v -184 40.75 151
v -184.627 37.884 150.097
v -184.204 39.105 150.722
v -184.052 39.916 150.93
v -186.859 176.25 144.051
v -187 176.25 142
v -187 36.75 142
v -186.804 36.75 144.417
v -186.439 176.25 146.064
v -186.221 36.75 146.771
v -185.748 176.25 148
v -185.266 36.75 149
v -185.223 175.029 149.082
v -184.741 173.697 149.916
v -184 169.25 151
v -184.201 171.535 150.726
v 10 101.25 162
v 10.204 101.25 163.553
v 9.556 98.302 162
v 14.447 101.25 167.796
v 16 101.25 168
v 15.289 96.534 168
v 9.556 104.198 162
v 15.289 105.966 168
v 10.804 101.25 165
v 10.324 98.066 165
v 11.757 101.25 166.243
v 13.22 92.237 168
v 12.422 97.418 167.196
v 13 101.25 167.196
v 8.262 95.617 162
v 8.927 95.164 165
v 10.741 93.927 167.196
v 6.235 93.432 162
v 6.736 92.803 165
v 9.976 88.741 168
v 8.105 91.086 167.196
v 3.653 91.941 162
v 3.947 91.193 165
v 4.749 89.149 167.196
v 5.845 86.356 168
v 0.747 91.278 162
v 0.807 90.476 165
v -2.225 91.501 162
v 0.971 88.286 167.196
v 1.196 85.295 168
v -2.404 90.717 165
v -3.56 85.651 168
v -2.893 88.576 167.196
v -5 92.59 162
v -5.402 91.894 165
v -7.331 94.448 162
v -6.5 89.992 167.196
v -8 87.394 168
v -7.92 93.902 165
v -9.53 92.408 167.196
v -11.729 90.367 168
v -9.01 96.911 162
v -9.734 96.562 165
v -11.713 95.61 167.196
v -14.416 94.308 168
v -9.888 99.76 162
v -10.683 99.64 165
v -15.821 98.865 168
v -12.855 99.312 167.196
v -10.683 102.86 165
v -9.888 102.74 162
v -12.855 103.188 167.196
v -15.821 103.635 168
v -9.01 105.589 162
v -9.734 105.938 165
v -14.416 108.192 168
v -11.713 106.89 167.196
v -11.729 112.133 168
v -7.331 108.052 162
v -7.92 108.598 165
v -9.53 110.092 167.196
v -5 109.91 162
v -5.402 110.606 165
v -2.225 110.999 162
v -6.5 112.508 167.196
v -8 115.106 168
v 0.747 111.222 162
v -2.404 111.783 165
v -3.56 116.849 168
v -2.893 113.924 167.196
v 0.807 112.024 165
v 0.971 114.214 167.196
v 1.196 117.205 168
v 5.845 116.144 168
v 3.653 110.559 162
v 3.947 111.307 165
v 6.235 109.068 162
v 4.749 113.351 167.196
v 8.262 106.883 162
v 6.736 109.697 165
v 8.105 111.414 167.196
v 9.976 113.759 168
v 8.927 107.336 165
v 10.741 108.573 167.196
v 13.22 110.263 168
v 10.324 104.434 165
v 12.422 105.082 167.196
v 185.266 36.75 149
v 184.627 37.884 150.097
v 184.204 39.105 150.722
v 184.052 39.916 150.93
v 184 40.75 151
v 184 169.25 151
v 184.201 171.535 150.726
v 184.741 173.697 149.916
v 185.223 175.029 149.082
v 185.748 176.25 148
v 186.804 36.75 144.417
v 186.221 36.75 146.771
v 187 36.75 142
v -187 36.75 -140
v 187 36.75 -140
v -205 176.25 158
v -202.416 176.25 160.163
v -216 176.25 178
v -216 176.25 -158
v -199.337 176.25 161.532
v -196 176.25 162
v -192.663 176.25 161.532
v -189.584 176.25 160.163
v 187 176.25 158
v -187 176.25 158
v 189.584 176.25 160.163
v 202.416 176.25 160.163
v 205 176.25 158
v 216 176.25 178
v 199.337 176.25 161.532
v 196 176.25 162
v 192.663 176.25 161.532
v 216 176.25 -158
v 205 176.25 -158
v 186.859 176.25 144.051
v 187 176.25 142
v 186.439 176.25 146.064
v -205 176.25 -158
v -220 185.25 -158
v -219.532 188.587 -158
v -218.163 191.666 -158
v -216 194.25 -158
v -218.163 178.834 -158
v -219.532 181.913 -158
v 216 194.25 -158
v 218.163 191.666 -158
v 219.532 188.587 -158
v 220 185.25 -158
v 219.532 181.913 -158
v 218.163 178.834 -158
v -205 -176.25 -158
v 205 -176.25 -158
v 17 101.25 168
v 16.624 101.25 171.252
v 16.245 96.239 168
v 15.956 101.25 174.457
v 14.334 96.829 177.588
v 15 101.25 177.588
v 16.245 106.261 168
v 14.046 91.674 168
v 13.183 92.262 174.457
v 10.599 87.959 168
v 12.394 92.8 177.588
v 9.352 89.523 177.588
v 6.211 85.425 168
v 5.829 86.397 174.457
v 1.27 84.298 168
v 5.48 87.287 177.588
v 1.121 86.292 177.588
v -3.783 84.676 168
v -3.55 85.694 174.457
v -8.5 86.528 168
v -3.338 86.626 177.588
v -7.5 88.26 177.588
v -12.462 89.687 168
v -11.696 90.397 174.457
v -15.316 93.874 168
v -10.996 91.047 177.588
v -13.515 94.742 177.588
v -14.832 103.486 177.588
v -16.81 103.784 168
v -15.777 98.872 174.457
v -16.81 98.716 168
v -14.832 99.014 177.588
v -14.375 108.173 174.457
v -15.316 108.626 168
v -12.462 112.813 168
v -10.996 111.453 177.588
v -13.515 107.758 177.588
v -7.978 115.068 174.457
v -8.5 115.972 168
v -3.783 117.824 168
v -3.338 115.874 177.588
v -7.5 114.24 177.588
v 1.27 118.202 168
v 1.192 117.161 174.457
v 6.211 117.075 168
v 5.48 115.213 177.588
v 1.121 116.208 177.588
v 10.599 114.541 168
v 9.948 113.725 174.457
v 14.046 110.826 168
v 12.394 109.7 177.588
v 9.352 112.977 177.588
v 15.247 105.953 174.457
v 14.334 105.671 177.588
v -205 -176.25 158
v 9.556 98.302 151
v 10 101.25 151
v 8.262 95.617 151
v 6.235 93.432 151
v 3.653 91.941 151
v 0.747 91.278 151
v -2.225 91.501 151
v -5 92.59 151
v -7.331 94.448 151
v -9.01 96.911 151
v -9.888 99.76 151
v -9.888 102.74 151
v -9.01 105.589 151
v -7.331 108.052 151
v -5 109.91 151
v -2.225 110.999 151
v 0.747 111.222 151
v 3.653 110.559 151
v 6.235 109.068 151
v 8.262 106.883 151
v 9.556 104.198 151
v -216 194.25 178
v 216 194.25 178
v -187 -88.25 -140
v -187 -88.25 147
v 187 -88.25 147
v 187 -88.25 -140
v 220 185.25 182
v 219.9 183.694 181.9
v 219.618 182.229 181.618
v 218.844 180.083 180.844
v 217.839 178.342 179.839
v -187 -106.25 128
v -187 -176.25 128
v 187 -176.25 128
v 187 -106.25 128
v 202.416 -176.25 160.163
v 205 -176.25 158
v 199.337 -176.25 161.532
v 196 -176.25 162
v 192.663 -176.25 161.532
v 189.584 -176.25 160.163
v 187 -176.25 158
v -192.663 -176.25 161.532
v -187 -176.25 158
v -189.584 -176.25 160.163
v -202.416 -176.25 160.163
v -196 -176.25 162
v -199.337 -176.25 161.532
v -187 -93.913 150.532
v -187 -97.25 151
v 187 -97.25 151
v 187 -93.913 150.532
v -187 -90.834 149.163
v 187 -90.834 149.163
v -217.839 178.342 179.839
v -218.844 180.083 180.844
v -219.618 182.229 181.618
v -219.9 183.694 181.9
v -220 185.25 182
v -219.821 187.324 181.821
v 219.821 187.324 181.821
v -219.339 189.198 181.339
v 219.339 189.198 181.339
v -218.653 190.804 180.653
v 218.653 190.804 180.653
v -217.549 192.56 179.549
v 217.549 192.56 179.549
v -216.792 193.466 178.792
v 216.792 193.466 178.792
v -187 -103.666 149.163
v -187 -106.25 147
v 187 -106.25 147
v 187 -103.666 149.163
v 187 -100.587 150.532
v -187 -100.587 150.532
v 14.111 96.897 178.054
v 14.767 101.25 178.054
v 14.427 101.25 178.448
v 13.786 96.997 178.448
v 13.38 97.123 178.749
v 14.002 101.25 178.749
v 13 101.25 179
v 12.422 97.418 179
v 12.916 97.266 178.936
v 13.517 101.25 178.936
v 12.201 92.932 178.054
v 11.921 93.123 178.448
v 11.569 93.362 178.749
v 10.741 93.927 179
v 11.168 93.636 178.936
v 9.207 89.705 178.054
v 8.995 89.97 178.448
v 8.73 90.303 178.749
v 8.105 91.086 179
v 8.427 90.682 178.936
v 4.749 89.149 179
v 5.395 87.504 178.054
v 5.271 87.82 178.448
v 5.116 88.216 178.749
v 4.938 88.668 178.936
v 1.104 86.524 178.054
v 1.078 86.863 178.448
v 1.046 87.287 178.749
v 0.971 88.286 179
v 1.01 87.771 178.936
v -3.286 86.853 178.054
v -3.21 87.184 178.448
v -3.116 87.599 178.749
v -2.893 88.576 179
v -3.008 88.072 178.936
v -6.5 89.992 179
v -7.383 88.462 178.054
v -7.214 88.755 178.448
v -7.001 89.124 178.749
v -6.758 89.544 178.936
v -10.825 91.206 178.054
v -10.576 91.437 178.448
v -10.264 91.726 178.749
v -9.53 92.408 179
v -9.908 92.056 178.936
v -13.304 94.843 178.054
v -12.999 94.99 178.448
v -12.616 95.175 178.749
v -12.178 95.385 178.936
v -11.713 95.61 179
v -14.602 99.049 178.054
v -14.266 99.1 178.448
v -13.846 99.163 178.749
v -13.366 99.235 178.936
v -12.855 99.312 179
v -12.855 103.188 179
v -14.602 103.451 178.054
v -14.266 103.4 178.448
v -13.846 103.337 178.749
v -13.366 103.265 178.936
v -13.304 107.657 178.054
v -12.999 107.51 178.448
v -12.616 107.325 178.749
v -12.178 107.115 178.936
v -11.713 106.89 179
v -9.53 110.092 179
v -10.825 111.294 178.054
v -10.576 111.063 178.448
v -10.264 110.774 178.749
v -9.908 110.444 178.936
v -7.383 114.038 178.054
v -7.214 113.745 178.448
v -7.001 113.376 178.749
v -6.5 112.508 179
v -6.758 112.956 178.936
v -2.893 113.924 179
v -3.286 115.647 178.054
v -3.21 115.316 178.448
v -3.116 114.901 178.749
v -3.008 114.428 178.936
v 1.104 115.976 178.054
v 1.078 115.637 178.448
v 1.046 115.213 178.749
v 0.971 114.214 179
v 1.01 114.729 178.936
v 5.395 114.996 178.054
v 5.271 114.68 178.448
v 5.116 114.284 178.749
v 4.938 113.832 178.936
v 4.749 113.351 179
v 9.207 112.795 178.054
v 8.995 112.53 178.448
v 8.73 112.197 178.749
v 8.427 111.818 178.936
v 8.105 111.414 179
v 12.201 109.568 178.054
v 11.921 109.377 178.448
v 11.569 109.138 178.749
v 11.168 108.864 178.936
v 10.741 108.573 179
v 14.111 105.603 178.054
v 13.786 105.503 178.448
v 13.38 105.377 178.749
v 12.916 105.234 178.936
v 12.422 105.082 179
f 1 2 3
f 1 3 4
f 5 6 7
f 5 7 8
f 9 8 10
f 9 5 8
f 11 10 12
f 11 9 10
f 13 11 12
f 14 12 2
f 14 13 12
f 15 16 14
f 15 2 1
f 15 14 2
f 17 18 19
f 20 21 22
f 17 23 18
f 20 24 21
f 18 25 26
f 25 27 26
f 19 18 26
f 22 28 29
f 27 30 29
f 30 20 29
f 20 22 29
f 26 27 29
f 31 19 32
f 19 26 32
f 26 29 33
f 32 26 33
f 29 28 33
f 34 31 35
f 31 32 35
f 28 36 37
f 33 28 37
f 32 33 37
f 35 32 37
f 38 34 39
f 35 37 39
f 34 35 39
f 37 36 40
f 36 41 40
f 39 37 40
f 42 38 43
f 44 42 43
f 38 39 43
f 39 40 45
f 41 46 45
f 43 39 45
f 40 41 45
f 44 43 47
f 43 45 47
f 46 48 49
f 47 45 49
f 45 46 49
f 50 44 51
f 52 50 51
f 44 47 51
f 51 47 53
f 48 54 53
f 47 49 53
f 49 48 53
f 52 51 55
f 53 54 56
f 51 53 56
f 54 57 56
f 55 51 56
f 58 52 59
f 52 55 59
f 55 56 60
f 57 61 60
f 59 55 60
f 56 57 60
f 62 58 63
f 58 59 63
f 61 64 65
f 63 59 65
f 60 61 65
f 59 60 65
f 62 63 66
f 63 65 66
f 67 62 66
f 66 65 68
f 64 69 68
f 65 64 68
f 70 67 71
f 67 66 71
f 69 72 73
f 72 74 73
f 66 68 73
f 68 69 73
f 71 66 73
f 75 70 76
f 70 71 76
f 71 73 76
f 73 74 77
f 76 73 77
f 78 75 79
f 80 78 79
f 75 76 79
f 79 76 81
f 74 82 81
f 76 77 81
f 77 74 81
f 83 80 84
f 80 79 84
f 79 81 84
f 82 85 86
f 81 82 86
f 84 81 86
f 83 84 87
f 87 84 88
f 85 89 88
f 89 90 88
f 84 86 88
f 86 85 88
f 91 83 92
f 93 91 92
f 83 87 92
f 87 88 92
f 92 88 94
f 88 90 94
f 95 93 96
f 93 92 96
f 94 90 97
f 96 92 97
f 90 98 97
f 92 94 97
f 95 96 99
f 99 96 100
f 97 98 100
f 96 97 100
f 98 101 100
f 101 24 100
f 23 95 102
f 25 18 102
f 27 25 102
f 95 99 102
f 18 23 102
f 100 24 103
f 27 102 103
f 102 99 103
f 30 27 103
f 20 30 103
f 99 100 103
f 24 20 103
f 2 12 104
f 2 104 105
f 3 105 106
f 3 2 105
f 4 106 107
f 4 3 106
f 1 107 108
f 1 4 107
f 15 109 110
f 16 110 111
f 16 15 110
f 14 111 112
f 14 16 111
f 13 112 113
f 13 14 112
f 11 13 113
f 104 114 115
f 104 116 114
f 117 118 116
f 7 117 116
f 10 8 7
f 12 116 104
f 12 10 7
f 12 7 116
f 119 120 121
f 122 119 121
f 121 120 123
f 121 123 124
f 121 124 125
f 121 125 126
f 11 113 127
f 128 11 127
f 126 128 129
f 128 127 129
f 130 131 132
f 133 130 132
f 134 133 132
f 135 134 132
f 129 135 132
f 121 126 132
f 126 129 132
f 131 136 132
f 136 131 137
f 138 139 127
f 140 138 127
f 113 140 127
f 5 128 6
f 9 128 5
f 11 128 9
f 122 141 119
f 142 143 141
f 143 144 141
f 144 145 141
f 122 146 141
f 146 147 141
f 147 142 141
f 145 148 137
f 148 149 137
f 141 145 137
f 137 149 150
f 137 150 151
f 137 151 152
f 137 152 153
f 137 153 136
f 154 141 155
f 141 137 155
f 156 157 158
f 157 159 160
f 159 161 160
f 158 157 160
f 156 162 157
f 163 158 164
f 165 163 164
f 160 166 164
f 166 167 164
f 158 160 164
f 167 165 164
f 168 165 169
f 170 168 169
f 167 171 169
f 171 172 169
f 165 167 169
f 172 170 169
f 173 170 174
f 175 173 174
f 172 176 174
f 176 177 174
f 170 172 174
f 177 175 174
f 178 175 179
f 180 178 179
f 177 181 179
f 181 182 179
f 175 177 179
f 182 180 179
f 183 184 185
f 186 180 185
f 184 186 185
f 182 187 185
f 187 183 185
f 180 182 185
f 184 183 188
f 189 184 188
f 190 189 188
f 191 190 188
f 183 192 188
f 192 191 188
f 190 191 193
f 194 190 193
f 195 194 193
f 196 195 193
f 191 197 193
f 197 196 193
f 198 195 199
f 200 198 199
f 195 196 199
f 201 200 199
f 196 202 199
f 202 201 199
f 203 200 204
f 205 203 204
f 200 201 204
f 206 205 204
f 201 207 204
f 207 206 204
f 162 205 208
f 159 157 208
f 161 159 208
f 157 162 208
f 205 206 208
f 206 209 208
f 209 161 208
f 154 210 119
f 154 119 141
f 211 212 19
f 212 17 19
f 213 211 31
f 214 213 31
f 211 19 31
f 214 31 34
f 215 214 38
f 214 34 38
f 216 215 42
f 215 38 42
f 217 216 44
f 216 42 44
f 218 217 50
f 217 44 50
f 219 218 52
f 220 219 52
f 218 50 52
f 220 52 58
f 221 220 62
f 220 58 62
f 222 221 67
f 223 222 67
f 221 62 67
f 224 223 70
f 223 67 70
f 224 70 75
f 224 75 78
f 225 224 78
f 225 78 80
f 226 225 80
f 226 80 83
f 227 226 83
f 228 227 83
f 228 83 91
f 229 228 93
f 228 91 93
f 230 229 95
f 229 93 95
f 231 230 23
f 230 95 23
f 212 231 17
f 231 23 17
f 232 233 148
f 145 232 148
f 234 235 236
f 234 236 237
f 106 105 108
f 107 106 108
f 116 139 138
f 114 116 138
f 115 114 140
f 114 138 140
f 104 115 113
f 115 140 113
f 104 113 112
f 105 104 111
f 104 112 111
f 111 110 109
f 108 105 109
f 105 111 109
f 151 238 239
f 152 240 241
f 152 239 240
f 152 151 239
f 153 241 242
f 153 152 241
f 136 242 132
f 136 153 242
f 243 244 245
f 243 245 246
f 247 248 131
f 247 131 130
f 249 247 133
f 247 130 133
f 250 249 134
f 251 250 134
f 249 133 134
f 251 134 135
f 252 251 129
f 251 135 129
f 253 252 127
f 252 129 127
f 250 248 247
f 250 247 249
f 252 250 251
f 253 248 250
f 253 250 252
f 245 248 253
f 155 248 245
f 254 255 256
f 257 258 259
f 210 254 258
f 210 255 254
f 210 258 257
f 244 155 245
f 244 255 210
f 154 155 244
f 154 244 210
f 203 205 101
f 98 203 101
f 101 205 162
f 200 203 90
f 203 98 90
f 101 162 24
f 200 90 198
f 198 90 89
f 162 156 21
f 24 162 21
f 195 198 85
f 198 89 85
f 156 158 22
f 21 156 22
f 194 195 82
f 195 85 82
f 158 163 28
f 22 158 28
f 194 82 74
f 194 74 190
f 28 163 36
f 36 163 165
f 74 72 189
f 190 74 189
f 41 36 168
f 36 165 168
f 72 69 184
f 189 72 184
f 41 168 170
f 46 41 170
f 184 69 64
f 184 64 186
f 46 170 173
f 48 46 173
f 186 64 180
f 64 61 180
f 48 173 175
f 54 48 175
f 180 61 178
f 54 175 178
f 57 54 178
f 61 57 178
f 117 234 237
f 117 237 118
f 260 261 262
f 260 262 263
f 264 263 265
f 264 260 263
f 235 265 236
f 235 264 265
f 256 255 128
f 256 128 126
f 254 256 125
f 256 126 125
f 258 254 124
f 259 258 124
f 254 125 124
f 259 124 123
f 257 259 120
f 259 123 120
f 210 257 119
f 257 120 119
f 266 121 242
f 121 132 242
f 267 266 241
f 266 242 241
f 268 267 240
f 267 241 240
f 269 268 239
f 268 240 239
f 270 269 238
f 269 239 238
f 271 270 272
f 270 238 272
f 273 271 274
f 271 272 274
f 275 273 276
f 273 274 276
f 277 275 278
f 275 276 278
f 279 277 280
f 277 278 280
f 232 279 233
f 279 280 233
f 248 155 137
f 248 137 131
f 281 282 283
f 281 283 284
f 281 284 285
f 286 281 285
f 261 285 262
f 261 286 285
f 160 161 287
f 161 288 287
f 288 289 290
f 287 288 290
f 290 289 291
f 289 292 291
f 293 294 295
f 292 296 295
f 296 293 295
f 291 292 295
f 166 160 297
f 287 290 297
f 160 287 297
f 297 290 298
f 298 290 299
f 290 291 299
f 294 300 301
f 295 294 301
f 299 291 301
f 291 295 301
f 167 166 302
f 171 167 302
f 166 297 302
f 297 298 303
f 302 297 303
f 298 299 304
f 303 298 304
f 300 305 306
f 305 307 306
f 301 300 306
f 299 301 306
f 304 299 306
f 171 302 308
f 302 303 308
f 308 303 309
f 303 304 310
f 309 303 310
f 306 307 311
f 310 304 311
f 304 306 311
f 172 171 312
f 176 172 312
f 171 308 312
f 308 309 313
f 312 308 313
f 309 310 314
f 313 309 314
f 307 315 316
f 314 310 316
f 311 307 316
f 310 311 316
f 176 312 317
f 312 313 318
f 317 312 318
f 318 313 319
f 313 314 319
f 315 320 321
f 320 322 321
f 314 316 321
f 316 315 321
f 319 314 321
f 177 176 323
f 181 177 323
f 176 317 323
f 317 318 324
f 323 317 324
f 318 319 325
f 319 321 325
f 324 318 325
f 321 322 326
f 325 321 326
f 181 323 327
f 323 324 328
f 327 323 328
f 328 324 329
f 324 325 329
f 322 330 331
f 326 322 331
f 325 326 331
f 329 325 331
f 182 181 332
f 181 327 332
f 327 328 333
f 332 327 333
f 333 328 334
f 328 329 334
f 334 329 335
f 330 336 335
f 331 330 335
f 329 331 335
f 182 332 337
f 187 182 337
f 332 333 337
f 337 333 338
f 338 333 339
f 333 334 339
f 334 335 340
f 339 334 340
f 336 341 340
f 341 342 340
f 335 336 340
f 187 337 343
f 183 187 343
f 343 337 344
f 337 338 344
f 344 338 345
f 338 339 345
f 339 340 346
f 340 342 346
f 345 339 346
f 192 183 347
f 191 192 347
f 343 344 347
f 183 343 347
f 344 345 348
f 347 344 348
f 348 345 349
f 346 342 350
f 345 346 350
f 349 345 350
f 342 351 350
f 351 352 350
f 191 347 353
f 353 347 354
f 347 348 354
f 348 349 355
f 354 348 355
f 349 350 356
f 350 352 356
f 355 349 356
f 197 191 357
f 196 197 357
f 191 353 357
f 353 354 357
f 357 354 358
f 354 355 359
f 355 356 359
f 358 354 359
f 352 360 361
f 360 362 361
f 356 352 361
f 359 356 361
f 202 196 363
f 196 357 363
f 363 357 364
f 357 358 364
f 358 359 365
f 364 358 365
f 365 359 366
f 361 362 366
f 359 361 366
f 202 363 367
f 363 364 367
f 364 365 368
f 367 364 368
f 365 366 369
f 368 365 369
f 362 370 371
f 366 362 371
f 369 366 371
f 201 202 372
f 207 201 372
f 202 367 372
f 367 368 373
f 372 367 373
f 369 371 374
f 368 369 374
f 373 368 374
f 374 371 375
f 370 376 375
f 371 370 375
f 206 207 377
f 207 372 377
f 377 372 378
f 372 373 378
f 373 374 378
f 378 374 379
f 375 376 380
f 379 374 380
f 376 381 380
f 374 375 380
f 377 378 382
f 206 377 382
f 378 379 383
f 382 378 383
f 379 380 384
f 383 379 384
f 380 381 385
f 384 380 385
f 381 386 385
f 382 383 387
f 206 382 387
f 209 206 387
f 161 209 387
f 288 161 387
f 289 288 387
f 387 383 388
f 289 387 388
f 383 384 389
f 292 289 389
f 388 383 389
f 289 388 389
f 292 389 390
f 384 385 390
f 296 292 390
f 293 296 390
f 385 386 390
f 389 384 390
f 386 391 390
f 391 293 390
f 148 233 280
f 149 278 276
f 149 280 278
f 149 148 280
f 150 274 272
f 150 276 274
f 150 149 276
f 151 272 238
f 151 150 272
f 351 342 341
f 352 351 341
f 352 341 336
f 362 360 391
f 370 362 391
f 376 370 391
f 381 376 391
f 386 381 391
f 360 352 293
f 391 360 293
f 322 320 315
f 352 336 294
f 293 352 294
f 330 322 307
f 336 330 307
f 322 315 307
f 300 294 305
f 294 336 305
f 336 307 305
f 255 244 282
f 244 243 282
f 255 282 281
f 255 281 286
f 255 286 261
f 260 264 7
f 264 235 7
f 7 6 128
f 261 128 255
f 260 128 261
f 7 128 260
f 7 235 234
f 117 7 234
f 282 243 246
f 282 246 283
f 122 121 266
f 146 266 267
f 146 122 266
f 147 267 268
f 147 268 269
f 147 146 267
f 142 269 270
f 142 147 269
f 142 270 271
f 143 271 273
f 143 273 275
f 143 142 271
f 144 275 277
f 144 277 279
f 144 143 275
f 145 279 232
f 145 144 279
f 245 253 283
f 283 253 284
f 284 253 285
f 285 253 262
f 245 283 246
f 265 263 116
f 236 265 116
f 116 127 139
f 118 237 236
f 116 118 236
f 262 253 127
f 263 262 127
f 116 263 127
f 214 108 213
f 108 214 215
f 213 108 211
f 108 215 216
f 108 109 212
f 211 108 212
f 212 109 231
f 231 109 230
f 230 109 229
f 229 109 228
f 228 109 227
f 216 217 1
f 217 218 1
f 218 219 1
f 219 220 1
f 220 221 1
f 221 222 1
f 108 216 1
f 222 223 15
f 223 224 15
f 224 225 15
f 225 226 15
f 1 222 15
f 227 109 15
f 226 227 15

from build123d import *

# Parameters (mm, degrees)
BOSS_EXTRU_1_DEPTH           = 176.25
ENL_V_MAT_EXTRU_1_DEPTH      = 374
ENL_V_MAT_EXTRU_2_REACH      = 440.777
BOSS_EXTRU_2_DEPTH           = 220
ENL_V_MAT_EXTRU_3_DEPTH      = 346.336158692
ENL_V_MAT_EXTRU_3_DEPTH_BACK = 346.336158692


with BuildPart() as part:
    # Esquisse1 → Boss.-Extru.1 (new, symmetric)
    with BuildSketch(Plane(origin=(0, 0, 0), x_dir=(1, 0, 0), z_dir=(0, 1, 0))):
        with BuildLine():
            Line((-205, 158), (205, 158))
            Line((205, 158), (205, -158))
            ThreePointArc((205, -158), (196, -162), (187, -158))
            Line((187, -158), (187, -151))
            Line((187, -151), (-187, -151))
            Line((-187, -151), (-187, -158))
            ThreePointArc((-187, -158), (-196, -162), (-205, -158))
            Line((-205, -158), (-205, 158))
        make_face()
    extrude(amount=BOSS_EXTRU_1_DEPTH, both=True)

    # Esquisse2 → Enlèv. mat.-Extru.1 (cut)
    with BuildSketch(Plane(origin=(-187, 0, 0), x_dir=(0, 0, -1), z_dir=(1, 0, 0))):
        with BuildLine():
            Line((-151, -97.25), (-151, -176.25))
            Line((-151, -176.25), (-128, -176.25))
            Line((-128, -176.25), (-128, -106.25))
            Line((-128, -106.25), (-147, -106.25))
            ThreePointArc((-147, -106.25), (-149.954965027, -102.174428901), (-151, -97.25))
        make_face()
        with BuildLine():
            Line((-151, 40.75), (-151, -97.25))
            ThreePointArc((-151, -97.25), (-149.954965027, -92.325571099), (-147, -88.25))
            Line((-147, -88.25), (140, -88.25))
            Line((140, -88.25), (140, 36.75))
            Line((140, 36.75), (-149, 36.75))
            ThreePointArc((-149, 36.75), (-150.472135955, 38.513932023), (-151, 40.75))
        make_face()
        with BuildLine():
            Line((-148, 176.25), (-151, 176.25))
            Line((-151, 176.25), (-151, 169.25))
            ThreePointArc((-151, 169.25), (-150.218401957, 173.057886553), (-148, 176.25))
        make_face()
    extrude(amount=ENL_V_MAT_EXTRU_1_DEPTH, mode=Mode.SUBTRACT)

    # Enlèv. mat.-Extru.2: up to this face of the body (flat: up to its plane)
    enl_v_mat_extru_2_end = Plane(part.part.faces().sort_by_distance((0, 36.75, 4.5))[0])
    # Esquisse3 → Enlèv. mat.-Extru.2 (cut, up to the picked face)
    with BuildSketch(Plane(origin=(0, 176.25, 0), x_dir=(1, 0, 0), z_dir=(0, 1, 0)), mode=Mode.PRIVATE) as enl_v_mat_extru_2_sk1:
        with BuildLine():
            Line((-187, -151), (-187, -142))
            ThreePointArc((-187, -142), (-186.230249471, -146.74341649), (-184, -151))
            Line((-184, -151), (-187, -151))
        make_face()
    enl_v_mat_extru_2_tool1 = split(extrude(enl_v_mat_extru_2_sk1.sketch, amount=-ENL_V_MAT_EXTRU_2_REACH, mode=Mode.PRIVATE), bisect_by=enl_v_mat_extru_2_end, keep=Keep.BOTH, mode=Mode.PRIVATE)
    # Esquisse3 → Enlèv. mat.-Extru.2 (cut, up to the picked face)
    with BuildSketch(Plane(origin=(0, 176.25, 0), x_dir=(1, 0, 0), z_dir=(0, 1, 0)), mode=Mode.PRIVATE) as enl_v_mat_extru_2_sk2:
        with BuildLine():
            Line((184, -151), (187, -151))
            Line((187, -151), (187, -142))
            ThreePointArc((187, -142), (186.230249471, -146.74341649), (184, -151))
        make_face()
    enl_v_mat_extru_2_tool2 = split(extrude(enl_v_mat_extru_2_sk2.sketch, amount=-ENL_V_MAT_EXTRU_2_REACH, mode=Mode.PRIVATE), bisect_by=enl_v_mat_extru_2_end, keep=Keep.BOTH, mode=Mode.PRIVATE)
    add(enl_v_mat_extru_2_tool1.solids().sort_by(Axis((-186.117852, 176.25, 148.797484), (0, -1, 0)))[0], mode=Mode.SUBTRACT)
    add(enl_v_mat_extru_2_tool2.solids().sort_by(Axis((186.117852, 176.25, 148.797484), (0, -1, 0)))[0], mode=Mode.SUBTRACT)

    # Esquisse4 → Boss.-Extru.2 (add, symmetric)
    with BuildSketch(Plane(origin=(0, 0, 0), x_dir=(0, 0, -1), z_dir=(1, 0, 0))):
        with BuildLine():
            Line((158, 176.25), (-178, 176.25))
            ThreePointArc((-178, 176.25), (-182, 185.25), (-178, 194.25))
            Line((-178, 194.25), (158, 194.25))
            Line((158, 194.25), (158, 176.25))
        make_face()
    extrude(amount=BOSS_EXTRU_2_DEPTH, both=True)

    # Esquisse5 → Enlèv. mat.-Extru.3 (cut, two sides: drawn at the far end of the back side and taken through both)
    with BuildSketch(Plane.XY.offset(-ENL_V_MAT_EXTRU_3_DEPTH_BACK)):
        with BuildLine():
            Line((220, 194.25), (216, 194.25))
            ThreePointArc((216, 194.25), (218.954965027, 190.174428901), (220, 185.25))
            Line((220, 185.25), (220, 194.25))
        make_face()
        with BuildLine():
            ThreePointArc((-220, 185.25), (-218.954965027, 190.174428901), (-216, 194.25))
            Line((-216, 194.25), (-220, 194.25))
            Line((-220, 194.25), (-220, 185.25))
        make_face()
        with BuildLine():
            ThreePointArc((-216, 176.25), (-218.954965027, 180.325571099), (-220, 185.25))
            Line((-220, 185.25), (-220, 176.25))
            Line((-220, 176.25), (-216, 176.25))
        make_face()
        with BuildLine():
            Line((220, 176.25), (220, 185.25))
            ThreePointArc((220, 185.25), (218.954965027, 180.325571099), (216, 176.25))
            Line((216, 176.25), (220, 176.25))
        make_face()
    extrude(amount=ENL_V_MAT_EXTRU_3_DEPTH + ENL_V_MAT_EXTRU_3_DEPTH_BACK, mode=Mode.SUBTRACT)

    # Esquisse6 → Révolution1 (revolve)
    with BuildSketch(Plane(origin=(0, 0, 0), x_dir=(0, 0, -1), z_dir=(1, 0, 0)), mode=Mode.PRIVATE) as r_volution1_sk:
        with BuildLine():
            Line((-151, 111.25), (-162, 111.25))
            ThreePointArc((-162, 111.25), (-166.242640687, 113.007359313), (-168, 117.25))
            Line((-168, 117.25), (-168, 118.25))
            ThreePointArc((-168, 118.25), (-172.862133877, 117.576087333), (-177.588231263, 116.25))
            ThreePointArc((-177.588231263, 116.25), (-178.611504042, 115.474039518), (-179, 114.25))
            Line((-179, 114.25), (-179, 101.25))
            Line((-179, 101.25), (-151, 101.25))
            Line((-151, 101.25), (-151, 111.25))
        make_face()
    revolve(r_volution1_sk.sketch.rotate(Axis((0, 101.25, 201.29718837), (0, 0, -1)), 90), axis=Axis((0, 101.25, 201.29718837), (0, 0, -1)))


solid = part.part
